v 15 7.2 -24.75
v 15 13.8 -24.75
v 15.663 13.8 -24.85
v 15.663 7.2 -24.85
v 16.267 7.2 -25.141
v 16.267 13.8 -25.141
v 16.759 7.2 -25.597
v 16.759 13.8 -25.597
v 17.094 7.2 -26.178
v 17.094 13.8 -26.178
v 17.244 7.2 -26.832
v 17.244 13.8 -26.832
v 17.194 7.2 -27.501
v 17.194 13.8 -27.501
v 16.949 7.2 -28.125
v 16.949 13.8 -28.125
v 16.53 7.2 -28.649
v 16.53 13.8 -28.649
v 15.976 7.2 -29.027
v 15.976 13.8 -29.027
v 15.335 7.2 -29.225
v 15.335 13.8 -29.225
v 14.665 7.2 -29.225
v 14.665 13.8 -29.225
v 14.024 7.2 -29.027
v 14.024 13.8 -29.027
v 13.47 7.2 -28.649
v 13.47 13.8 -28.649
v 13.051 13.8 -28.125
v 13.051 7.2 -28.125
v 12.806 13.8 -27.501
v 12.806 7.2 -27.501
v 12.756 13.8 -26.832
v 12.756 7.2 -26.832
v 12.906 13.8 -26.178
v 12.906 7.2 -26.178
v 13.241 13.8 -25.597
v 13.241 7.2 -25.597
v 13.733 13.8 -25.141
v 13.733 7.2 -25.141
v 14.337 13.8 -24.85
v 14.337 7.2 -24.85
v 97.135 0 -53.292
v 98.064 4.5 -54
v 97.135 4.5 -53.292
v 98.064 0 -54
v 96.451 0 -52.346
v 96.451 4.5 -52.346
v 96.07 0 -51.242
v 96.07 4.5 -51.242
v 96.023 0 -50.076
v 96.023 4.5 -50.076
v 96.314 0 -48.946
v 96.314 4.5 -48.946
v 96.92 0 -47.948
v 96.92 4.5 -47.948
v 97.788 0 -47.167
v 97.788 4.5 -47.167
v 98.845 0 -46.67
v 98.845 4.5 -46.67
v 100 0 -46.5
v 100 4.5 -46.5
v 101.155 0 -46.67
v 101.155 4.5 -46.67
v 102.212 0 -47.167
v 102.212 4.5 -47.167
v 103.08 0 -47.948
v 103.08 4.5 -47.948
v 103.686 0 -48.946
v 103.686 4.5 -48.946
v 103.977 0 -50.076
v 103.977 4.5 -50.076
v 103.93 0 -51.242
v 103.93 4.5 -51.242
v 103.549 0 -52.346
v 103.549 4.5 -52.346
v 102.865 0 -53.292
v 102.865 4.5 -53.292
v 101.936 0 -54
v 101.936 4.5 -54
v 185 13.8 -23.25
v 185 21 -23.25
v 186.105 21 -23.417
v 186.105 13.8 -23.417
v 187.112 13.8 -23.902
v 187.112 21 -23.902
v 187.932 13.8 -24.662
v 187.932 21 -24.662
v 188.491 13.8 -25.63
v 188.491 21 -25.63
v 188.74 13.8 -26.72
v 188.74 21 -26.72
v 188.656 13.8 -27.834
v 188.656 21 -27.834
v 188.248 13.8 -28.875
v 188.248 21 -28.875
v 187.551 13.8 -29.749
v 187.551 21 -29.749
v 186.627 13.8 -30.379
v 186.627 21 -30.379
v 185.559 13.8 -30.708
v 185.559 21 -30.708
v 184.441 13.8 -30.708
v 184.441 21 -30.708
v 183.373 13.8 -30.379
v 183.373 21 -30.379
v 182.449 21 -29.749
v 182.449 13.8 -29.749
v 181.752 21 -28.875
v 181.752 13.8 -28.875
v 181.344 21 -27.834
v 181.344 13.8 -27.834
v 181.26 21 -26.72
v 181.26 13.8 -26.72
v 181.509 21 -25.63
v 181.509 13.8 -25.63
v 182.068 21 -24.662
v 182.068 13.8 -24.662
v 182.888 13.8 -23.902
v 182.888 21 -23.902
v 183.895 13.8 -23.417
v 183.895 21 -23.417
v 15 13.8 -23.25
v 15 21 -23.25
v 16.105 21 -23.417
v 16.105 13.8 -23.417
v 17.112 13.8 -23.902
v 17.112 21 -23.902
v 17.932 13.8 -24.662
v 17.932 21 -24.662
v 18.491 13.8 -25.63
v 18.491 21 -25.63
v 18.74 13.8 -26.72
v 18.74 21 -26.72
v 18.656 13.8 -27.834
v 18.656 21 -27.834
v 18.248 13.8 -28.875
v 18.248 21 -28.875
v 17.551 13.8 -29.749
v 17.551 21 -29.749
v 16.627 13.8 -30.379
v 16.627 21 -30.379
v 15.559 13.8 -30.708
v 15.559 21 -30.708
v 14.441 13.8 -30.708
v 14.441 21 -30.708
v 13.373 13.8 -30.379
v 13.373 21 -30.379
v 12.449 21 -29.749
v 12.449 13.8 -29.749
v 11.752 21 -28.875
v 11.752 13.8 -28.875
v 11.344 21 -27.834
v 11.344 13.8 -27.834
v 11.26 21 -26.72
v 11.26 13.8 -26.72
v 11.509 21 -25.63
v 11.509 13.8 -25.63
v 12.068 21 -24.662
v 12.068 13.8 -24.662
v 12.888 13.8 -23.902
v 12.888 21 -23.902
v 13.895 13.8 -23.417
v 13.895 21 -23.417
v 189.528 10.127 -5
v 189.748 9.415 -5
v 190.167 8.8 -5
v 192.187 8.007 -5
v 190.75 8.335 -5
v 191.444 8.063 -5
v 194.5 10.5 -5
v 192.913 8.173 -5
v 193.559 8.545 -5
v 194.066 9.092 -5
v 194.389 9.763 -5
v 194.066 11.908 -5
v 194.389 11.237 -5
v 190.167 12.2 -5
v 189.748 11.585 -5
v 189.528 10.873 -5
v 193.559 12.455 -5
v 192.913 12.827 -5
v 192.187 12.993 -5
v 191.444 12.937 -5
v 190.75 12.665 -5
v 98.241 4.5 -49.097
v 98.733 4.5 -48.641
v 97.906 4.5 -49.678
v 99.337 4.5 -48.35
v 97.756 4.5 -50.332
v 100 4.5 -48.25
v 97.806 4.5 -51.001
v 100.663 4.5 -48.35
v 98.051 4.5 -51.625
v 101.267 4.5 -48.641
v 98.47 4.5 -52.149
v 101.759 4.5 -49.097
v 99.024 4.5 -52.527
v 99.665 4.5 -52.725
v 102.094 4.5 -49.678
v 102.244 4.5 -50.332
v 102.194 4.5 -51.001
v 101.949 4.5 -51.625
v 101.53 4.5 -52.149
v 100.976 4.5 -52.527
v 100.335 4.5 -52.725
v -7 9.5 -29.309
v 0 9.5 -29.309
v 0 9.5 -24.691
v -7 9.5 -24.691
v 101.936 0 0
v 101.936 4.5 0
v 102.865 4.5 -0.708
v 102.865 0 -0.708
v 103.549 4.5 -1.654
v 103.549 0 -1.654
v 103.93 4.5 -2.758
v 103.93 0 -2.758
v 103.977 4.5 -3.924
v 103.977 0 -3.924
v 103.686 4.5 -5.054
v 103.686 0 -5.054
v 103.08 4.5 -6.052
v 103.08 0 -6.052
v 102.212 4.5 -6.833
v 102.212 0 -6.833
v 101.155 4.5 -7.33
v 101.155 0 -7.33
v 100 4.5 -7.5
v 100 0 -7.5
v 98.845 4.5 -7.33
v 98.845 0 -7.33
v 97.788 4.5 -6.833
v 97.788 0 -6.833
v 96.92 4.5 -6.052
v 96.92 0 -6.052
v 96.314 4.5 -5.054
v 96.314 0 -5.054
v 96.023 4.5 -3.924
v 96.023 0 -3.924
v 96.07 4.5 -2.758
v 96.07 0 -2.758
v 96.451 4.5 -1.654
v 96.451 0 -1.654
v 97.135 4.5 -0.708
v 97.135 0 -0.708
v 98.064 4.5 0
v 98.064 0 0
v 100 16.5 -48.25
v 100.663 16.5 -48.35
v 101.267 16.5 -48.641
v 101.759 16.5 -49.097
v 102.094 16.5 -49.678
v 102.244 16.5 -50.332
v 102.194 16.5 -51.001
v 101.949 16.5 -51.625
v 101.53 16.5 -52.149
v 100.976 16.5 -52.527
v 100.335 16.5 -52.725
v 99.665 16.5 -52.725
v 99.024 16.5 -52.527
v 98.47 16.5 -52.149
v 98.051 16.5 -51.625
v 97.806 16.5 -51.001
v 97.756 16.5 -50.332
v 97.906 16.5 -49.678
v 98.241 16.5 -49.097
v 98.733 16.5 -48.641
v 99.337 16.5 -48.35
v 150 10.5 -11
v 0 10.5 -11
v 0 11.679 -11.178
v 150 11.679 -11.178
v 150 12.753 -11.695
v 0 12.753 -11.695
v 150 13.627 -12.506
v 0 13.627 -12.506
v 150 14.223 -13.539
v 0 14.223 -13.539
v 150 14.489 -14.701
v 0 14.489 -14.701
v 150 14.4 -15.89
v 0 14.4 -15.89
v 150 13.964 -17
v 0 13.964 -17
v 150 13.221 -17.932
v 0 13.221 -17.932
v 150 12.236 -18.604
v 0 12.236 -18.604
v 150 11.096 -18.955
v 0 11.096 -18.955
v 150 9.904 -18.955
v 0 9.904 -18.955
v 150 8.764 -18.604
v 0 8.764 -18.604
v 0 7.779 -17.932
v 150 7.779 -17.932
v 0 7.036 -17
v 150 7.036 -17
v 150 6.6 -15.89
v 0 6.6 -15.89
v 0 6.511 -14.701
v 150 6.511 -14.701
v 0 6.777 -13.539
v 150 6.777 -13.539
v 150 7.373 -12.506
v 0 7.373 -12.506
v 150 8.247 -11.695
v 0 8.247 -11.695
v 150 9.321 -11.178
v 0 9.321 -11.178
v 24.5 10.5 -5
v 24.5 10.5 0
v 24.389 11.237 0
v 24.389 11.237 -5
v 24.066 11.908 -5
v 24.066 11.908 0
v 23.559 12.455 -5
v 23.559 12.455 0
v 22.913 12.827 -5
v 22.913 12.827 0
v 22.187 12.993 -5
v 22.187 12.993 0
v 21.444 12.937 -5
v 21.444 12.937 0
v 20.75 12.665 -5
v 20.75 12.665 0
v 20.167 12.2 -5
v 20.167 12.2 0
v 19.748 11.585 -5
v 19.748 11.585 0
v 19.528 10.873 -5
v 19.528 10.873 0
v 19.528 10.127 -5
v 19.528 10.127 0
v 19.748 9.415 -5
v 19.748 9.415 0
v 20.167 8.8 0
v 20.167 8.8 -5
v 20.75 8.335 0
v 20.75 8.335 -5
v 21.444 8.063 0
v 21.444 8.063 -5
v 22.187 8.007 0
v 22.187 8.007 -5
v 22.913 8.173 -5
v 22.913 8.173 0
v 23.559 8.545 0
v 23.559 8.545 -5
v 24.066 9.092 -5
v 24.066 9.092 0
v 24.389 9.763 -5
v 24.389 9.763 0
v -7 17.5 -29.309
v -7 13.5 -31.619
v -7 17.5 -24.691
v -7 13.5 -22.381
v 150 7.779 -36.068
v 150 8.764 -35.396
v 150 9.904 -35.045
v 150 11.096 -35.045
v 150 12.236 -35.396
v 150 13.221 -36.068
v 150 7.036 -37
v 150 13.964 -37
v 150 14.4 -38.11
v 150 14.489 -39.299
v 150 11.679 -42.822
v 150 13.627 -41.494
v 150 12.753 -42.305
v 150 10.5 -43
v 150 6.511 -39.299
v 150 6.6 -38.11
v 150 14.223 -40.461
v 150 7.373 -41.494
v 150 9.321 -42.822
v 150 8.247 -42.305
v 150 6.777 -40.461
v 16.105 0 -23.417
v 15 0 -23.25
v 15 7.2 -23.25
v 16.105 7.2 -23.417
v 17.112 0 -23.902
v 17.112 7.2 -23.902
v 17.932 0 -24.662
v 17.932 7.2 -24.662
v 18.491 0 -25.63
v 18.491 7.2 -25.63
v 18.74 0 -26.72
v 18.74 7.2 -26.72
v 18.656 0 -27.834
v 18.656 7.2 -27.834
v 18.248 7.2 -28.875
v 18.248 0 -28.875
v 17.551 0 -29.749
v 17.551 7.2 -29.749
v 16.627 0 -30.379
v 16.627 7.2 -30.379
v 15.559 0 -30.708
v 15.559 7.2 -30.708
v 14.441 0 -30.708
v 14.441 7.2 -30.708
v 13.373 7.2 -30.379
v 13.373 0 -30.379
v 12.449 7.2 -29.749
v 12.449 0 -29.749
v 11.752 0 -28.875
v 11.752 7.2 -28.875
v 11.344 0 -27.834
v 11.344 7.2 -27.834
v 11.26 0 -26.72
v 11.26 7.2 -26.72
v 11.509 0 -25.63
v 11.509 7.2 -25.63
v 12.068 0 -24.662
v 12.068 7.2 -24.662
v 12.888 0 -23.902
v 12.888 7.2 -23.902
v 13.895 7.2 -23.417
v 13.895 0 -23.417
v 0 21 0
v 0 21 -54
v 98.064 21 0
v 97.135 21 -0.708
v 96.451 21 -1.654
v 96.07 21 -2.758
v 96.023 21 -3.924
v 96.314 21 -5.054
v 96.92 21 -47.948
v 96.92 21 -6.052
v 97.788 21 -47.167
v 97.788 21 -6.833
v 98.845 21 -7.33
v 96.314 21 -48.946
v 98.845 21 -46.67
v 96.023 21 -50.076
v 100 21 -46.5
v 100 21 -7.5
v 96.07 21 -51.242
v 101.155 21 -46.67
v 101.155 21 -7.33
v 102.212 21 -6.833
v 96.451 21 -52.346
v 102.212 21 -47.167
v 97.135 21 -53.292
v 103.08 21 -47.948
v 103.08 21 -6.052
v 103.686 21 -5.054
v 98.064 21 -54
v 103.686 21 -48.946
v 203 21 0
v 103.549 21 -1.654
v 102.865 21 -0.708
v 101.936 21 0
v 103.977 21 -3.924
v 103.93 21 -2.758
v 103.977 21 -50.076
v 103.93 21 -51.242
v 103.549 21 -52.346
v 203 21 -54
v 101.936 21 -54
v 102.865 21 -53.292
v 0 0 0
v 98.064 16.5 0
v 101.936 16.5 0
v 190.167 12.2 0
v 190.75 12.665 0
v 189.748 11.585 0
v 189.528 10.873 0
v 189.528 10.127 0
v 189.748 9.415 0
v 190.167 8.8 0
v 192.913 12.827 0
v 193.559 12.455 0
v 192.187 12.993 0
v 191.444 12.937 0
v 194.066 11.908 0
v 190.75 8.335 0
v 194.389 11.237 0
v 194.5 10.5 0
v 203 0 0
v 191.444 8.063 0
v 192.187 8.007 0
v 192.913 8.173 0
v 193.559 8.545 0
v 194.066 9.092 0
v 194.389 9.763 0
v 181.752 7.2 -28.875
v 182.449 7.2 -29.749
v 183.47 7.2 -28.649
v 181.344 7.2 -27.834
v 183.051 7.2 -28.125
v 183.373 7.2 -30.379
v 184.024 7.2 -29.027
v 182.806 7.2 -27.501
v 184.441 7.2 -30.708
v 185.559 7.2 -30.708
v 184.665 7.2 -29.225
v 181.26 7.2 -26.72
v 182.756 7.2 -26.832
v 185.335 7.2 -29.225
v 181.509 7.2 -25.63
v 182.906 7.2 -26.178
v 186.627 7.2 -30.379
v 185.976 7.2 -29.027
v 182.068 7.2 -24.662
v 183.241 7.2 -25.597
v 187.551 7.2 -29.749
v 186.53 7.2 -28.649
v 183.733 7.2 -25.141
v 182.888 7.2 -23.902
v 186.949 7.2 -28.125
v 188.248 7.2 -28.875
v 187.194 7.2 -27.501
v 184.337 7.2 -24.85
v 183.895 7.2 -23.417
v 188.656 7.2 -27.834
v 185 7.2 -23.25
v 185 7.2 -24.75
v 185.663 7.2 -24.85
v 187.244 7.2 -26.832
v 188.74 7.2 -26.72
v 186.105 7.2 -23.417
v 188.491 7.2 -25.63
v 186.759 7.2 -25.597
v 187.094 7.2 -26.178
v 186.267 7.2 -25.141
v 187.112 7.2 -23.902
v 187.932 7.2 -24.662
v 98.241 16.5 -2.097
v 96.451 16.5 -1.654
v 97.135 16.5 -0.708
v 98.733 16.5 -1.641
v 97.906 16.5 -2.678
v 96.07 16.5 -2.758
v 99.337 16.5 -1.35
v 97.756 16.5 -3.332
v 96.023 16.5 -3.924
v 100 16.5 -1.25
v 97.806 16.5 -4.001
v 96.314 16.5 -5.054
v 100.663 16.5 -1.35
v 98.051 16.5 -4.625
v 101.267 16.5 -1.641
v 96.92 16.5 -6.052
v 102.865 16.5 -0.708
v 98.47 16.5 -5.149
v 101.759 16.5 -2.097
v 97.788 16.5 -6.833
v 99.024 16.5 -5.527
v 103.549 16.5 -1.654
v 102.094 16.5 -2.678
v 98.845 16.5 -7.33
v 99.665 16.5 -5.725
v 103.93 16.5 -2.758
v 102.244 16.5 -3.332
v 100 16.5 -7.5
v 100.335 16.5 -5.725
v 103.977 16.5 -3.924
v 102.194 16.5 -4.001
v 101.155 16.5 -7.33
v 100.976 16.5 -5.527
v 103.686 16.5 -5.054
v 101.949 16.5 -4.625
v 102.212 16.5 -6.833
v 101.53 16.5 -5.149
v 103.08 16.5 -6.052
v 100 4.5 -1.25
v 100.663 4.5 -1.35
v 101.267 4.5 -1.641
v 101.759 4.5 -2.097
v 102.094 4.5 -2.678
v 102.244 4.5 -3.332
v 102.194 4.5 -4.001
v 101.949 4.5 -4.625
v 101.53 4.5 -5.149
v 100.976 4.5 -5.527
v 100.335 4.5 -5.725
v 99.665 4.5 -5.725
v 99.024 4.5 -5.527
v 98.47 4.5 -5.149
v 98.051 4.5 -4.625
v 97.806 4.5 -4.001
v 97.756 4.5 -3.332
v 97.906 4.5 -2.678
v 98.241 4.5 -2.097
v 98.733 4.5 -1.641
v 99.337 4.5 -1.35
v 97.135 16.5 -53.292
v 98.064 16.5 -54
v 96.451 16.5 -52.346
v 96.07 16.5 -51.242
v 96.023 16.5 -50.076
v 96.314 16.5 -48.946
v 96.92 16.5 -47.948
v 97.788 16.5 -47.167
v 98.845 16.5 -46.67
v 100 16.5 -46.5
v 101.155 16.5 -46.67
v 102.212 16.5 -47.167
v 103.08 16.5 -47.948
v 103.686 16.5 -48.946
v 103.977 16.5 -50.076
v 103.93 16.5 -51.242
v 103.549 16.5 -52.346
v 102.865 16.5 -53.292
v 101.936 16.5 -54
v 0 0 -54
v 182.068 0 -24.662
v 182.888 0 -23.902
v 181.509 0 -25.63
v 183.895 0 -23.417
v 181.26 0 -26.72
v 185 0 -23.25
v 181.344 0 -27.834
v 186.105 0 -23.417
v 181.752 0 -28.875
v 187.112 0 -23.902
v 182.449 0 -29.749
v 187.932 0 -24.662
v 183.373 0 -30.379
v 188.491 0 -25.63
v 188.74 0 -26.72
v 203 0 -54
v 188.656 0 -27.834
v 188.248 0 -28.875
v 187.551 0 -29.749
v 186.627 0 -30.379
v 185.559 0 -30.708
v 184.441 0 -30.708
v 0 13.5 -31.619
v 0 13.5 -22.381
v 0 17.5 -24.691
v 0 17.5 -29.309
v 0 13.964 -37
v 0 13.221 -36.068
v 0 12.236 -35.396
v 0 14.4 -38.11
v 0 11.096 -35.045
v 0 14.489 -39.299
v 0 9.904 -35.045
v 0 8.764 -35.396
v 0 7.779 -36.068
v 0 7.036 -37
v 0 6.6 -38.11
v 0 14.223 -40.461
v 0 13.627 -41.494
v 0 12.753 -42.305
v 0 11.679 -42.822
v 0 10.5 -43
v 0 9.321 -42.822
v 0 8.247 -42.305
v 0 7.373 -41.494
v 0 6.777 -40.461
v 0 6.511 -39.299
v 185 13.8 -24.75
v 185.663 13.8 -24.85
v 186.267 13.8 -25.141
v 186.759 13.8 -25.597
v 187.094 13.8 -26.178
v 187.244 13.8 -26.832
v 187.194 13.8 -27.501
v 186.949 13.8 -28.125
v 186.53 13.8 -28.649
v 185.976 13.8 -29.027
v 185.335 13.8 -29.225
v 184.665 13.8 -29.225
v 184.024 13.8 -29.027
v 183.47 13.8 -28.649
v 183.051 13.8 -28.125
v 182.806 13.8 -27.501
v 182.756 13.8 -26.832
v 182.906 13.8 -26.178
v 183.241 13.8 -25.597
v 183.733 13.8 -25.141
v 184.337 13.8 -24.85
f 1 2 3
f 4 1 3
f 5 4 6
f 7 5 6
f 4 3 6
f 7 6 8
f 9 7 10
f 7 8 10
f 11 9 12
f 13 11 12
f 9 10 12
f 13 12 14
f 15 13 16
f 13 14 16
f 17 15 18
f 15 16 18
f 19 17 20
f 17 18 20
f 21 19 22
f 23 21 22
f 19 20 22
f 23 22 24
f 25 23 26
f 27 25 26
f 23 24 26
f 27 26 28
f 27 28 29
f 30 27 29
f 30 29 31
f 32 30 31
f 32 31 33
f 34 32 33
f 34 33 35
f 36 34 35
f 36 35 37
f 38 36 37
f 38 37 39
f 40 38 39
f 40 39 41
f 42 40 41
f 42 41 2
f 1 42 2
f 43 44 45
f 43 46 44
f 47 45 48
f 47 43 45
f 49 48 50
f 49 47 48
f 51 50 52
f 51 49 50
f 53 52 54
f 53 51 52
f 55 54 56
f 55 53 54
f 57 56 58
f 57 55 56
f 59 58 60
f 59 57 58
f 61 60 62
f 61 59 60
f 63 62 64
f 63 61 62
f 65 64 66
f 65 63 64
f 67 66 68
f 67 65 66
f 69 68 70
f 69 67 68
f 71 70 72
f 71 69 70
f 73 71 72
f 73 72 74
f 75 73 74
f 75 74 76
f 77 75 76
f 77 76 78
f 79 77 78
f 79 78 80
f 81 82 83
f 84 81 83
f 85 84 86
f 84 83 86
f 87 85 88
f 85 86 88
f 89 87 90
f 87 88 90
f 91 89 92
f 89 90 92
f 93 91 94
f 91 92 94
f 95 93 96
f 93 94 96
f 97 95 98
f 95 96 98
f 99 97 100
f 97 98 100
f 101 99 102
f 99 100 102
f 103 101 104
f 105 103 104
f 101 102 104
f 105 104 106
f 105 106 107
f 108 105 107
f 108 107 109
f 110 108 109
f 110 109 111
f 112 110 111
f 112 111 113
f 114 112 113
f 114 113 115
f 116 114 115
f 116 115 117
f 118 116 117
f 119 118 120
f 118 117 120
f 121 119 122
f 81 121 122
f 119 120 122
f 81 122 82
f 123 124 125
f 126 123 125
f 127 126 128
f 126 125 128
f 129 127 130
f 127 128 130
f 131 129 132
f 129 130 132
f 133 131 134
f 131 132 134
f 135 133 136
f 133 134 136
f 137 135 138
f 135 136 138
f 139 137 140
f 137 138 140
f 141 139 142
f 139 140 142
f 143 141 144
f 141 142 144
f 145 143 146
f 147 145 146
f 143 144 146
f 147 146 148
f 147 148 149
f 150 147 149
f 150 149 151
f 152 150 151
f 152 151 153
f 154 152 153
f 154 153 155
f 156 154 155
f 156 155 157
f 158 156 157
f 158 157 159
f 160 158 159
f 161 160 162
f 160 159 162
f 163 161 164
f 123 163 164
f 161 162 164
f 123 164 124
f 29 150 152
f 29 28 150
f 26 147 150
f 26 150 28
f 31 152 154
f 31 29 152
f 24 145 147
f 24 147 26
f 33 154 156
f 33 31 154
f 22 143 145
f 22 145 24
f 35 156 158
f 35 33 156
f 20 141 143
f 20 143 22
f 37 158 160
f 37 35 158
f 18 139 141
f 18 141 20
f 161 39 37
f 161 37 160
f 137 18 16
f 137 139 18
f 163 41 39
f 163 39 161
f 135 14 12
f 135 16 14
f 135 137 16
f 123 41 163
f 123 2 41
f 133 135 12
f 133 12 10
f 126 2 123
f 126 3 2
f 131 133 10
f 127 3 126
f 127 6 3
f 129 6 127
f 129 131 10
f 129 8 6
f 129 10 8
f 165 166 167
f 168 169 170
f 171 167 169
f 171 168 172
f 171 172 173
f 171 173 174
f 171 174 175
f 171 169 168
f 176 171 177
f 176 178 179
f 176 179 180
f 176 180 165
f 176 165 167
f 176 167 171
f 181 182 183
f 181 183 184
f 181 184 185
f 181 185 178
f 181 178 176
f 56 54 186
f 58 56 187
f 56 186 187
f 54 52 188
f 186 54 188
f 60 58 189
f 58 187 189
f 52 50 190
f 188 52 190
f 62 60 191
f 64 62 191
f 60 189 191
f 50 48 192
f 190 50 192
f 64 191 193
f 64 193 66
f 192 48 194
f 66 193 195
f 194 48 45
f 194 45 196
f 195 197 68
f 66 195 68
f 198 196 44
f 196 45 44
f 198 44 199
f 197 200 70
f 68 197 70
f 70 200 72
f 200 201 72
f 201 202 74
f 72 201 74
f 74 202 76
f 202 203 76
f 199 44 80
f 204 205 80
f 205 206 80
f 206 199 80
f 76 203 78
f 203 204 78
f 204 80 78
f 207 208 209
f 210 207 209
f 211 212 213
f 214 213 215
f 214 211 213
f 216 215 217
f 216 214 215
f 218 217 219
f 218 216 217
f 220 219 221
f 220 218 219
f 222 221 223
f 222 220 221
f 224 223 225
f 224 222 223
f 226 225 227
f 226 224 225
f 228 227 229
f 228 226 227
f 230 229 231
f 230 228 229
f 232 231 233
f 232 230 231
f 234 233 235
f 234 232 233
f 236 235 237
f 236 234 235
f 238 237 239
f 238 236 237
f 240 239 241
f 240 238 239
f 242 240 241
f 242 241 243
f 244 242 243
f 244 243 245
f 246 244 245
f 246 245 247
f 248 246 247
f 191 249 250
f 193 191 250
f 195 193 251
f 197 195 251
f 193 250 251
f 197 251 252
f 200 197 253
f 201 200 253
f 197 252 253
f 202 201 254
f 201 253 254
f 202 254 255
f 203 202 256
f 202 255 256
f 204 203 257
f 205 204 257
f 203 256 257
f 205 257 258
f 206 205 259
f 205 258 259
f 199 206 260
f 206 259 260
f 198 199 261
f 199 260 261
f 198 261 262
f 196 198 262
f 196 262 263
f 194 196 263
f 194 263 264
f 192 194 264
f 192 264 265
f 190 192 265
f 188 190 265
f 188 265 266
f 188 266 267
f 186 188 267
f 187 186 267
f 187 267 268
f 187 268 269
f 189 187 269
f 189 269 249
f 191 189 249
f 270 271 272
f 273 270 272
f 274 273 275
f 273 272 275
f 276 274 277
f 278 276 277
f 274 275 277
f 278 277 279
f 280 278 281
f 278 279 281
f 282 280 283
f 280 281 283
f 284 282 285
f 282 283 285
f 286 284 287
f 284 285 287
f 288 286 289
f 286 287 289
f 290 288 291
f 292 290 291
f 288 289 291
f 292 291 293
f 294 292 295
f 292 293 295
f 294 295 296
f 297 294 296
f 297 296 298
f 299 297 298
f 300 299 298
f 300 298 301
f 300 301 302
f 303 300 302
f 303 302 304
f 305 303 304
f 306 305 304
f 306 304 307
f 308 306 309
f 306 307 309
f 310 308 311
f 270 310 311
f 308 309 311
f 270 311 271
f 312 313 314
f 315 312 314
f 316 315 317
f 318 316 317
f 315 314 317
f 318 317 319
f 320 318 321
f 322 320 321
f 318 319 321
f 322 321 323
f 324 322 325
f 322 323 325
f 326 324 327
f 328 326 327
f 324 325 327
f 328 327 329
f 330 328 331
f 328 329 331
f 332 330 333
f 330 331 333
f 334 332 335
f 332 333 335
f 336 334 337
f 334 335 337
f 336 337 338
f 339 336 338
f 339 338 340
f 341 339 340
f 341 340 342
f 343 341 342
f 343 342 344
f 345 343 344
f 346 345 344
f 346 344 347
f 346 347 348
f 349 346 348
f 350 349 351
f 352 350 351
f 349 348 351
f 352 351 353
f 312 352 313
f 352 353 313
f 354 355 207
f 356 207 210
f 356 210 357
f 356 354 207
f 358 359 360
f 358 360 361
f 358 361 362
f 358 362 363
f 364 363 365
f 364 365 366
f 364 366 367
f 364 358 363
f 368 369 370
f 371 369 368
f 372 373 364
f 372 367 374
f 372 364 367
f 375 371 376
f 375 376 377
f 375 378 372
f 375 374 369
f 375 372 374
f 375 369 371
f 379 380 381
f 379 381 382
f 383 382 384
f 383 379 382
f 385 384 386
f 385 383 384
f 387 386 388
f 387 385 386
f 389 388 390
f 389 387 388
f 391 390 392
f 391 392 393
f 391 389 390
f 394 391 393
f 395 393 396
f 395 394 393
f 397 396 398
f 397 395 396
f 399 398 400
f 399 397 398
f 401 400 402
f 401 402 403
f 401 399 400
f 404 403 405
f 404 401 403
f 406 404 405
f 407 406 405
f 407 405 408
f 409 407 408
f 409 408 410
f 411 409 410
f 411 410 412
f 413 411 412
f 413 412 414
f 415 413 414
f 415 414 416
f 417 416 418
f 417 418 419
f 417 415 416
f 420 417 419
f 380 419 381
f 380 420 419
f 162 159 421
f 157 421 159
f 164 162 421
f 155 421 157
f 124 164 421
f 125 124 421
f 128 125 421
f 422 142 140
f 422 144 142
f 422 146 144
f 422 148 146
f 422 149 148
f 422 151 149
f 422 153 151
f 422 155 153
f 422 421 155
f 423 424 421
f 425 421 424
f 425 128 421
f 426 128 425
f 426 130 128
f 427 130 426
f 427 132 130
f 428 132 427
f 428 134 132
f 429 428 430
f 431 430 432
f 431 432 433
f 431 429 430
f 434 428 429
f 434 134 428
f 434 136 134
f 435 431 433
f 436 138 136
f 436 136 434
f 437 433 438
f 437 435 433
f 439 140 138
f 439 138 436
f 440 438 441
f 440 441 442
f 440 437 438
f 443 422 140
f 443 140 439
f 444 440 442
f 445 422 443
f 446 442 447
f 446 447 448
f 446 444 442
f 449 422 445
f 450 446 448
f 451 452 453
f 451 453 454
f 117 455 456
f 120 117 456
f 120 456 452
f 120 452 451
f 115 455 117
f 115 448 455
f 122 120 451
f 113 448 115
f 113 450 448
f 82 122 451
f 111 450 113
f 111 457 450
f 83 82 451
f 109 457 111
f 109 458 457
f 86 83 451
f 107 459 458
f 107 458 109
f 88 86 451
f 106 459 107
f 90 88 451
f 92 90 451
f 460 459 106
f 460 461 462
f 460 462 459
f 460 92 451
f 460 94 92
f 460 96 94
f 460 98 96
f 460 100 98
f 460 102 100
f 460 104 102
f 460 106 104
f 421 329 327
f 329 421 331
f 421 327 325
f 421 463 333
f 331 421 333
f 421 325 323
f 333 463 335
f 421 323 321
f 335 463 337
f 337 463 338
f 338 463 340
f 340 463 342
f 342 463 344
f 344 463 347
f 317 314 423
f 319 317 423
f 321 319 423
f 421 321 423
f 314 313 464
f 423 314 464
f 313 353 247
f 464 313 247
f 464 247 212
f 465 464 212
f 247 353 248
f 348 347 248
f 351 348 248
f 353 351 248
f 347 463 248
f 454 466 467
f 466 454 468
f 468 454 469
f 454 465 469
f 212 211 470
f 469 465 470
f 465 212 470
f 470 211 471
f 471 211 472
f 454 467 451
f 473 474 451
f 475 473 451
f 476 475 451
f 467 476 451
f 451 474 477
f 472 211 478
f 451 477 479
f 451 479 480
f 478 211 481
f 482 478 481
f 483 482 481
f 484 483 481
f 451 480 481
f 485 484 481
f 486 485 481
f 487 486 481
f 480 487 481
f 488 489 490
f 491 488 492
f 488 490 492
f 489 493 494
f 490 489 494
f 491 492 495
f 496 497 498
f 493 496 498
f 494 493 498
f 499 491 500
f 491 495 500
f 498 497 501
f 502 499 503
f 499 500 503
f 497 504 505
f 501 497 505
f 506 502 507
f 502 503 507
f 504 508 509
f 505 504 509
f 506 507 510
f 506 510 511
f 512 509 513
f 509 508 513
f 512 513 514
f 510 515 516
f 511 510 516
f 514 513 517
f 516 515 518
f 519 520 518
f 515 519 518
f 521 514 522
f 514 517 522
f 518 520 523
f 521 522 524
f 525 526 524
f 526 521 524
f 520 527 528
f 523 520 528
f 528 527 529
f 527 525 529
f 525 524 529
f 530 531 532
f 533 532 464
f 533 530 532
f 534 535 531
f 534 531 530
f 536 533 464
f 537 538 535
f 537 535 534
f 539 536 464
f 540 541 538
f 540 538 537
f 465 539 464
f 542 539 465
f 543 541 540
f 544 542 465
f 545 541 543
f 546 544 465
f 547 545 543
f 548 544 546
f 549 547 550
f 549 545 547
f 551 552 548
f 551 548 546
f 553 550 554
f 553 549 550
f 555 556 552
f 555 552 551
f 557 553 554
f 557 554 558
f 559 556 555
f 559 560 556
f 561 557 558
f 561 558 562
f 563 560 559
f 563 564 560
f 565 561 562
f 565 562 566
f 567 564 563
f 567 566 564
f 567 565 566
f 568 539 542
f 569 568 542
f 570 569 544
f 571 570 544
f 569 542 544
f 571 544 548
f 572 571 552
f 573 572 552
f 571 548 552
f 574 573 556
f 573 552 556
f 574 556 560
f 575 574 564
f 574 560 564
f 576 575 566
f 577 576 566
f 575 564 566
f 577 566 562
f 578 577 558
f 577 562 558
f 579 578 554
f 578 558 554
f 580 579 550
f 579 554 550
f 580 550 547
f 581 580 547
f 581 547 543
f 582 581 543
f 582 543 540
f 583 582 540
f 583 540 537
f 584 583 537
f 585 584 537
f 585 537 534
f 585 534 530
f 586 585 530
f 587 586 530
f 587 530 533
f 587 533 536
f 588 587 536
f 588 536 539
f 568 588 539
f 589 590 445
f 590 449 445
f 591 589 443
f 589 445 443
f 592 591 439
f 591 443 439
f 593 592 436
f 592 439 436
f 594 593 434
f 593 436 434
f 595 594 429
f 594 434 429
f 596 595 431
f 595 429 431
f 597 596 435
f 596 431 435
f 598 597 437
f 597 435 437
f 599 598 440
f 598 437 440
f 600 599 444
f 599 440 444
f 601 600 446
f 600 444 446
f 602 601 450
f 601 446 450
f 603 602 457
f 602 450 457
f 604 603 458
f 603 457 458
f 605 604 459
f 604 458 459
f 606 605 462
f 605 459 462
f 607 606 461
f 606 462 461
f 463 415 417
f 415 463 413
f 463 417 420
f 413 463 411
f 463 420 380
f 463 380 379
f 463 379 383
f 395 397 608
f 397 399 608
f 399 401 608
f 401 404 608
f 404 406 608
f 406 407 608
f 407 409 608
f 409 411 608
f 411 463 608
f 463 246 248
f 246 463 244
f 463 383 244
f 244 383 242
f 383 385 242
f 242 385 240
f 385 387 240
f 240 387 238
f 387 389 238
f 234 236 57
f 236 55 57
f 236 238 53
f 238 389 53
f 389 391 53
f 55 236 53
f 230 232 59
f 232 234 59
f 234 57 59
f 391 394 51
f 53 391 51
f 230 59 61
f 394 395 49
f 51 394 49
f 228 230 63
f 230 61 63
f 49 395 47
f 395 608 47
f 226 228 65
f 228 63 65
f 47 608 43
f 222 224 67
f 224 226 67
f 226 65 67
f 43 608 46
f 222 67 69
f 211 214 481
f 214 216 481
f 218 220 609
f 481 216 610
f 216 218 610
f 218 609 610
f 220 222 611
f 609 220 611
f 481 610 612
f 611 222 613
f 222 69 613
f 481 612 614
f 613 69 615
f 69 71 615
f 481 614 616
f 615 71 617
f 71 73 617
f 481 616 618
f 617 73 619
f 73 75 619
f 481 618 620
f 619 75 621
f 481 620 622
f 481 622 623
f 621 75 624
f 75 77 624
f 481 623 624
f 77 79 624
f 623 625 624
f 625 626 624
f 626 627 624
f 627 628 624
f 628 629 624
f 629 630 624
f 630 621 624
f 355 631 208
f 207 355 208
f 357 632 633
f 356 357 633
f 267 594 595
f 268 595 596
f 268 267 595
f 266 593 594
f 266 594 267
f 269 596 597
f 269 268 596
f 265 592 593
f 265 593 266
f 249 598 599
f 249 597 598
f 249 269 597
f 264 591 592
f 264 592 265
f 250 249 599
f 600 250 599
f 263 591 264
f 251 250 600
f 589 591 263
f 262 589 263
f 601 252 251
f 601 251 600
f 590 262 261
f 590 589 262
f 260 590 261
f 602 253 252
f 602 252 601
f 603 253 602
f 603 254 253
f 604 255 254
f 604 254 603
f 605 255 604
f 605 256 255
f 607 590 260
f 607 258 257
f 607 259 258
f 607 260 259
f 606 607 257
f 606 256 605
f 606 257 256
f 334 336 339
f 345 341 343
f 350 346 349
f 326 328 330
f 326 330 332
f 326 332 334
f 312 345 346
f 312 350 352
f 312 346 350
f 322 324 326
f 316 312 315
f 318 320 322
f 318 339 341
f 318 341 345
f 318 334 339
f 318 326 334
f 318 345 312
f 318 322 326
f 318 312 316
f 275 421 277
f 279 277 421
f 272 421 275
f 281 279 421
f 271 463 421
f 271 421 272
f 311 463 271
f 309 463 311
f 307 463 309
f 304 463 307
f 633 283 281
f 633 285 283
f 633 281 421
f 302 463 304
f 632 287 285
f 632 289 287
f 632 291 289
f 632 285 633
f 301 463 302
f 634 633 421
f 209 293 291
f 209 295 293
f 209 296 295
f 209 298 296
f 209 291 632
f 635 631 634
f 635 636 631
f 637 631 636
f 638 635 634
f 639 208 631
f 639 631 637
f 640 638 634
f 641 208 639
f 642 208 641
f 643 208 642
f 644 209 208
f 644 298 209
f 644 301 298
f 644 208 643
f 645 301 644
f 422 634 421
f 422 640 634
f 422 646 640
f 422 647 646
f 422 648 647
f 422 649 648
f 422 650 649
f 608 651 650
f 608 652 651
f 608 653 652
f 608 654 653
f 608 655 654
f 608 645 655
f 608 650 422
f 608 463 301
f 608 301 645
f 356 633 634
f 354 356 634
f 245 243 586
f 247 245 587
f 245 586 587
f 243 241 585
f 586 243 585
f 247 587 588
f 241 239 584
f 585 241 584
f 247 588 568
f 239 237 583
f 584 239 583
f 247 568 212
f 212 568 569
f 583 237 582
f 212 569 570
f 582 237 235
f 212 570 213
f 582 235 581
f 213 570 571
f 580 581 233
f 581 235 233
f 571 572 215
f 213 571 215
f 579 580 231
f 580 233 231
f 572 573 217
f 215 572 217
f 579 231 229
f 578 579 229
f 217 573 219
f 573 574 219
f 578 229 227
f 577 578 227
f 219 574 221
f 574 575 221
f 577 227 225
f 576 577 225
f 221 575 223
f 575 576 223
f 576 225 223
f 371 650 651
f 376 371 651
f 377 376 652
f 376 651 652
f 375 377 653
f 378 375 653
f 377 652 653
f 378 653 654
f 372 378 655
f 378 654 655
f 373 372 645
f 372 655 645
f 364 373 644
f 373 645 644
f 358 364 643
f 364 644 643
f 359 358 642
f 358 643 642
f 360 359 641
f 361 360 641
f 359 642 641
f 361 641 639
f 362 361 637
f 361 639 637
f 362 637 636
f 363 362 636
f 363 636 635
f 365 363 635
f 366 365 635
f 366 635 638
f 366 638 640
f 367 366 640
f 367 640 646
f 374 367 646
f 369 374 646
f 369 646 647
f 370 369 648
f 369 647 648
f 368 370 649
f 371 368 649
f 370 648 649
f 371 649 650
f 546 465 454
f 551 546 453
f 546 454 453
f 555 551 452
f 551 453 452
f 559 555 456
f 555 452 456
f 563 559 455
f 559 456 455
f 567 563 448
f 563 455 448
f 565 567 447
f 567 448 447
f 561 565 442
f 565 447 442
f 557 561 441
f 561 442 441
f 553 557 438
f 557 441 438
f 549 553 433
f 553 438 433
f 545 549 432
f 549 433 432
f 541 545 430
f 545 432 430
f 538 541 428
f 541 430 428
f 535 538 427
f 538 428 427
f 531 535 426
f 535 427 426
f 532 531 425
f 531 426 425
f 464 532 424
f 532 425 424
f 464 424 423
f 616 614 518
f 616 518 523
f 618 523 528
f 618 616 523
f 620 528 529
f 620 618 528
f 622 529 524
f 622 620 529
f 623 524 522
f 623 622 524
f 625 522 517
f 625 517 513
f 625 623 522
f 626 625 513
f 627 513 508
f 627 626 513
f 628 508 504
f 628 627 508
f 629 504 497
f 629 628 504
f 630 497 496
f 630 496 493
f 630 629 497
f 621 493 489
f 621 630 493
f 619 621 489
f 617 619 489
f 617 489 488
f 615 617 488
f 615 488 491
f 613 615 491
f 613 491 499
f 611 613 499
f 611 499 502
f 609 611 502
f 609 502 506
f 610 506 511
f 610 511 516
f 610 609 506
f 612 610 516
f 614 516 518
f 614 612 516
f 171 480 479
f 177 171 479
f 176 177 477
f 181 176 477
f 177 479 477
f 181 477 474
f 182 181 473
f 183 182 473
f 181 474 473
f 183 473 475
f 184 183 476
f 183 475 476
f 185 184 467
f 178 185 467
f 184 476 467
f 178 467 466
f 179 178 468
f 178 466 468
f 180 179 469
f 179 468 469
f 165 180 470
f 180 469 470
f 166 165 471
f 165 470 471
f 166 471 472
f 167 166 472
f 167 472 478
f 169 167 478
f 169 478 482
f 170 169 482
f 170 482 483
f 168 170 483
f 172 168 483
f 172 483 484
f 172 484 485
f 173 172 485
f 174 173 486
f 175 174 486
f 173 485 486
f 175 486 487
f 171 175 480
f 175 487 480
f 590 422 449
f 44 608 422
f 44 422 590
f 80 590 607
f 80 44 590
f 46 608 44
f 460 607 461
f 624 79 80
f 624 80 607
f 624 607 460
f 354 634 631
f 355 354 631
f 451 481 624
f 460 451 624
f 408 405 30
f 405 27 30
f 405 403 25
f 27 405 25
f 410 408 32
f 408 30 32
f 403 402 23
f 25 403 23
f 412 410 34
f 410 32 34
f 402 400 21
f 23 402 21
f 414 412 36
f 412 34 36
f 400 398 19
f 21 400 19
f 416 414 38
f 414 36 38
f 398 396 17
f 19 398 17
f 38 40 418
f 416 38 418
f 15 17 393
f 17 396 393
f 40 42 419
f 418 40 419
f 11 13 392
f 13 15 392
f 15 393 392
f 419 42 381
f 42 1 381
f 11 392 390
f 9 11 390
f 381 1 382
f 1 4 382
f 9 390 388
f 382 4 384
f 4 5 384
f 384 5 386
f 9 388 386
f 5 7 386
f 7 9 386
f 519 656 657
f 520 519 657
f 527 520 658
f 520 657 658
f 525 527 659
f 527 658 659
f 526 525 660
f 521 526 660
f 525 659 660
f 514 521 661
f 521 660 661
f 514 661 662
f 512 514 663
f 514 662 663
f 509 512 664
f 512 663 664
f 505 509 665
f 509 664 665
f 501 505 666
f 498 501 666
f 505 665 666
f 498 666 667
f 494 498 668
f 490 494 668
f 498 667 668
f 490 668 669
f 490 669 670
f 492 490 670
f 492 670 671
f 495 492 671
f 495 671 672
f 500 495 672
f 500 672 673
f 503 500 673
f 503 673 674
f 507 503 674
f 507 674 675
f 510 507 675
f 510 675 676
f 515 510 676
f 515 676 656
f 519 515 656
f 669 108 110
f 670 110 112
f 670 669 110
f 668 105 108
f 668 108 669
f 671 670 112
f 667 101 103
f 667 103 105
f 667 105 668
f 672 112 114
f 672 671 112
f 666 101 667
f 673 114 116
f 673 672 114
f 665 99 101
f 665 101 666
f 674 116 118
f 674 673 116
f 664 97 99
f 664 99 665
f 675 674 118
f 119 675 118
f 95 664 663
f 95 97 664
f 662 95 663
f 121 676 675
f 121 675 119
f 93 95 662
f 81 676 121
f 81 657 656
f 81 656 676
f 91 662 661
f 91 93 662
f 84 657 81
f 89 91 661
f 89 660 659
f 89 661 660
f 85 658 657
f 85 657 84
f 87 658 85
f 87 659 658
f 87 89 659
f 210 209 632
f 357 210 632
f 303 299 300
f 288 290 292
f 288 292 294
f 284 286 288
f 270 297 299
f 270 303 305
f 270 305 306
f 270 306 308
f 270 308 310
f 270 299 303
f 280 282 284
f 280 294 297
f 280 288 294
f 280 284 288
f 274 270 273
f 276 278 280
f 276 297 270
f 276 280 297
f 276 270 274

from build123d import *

# Parameters (mm, degrees)
SKETCH_1_W          = 203
SKETCH_1_H          = 54
EXTRUDE_1_DEPTH     = 21
SKETCH_2_R          = 4
CUT_EXTRUDE_1_DEPTH = 150
SKETCH_3_R          = 2.25
CUT_EXTRUDE_2_DEPTH = 212.106608139
SKETCH_4_R          = 4
CUT_EXTRUDE_3_DEPTH = 4.5
SKETCH_5_R          = 3.75
CUT_EXTRUDE_4_DEPTH = 7.2
SKETCH_6_R          = 2.5
CUT_EXTRUDE_5_DEPTH = 5
EXTRUDE_2_DEPTH     = 7


with BuildPart() as part:
    # 草图1 → 凸台-拉伸1 (new body)
    with BuildSketch(Plane(origin=(0, 0, 0), x_dir=(1, 0, 0), z_dir=(0, 1, 0))):
        with Locations((101.5, 27)):
            Rectangle(SKETCH_1_W, SKETCH_1_H)
    extrude(amount=EXTRUDE_1_DEPTH)

    # 草图2 → 切除-拉伸1 (cut)
    with BuildSketch(Plane.ZY):
        with Locations((-15, 10.5)):
            Circle(SKETCH_2_R)
        with Locations(Location((-39, 10.5, 0), (0, 0, 180))):
            Circle(SKETCH_2_R)
    extrude(amount=-CUT_EXTRUDE_1_DEPTH, mode=Mode.SUBTRACT)

    # 草图3 → 切除-拉伸2 (cut, through all)
    with BuildSketch(Plane(origin=(0, 21, 0), x_dir=(1, 0, 0), z_dir=(0, 1, 0))):
        with Locations(Location((100, 3.5, 0), (0, 0, 270))):
            Circle(SKETCH_3_R)
        with Locations(Location((100, 50.5, 0), (0, 0, 270))):
            Circle(SKETCH_3_R)
        with Locations(Location((15, 27, 0), (0, 0, 270))):
            Circle(SKETCH_3_R)
        with Locations(Location((185, 27, 0), (0, 0, 270))):
            Circle(SKETCH_3_R)
    extrude(amount=-CUT_EXTRUDE_2_DEPTH, mode=Mode.SUBTRACT)

    # 草图4 → 切除-拉伸3 (cut)
    with BuildSketch(Plane(origin=(0, 21, 0), x_dir=(1, 0, 0), z_dir=(0, 1, 0))):
        with Locations((100, 50.5)):
            Circle(SKETCH_4_R)
        with Locations((100, 3.5)):
            Circle(SKETCH_4_R)
    cut_extrude_3 = extrude(amount=-CUT_EXTRUDE_3_DEPTH, mode=Mode.SUBTRACT)

    # 草图5 → 切除-拉伸4 (cut)
    with BuildSketch(Plane(origin=(0, 21, 0), x_dir=(1, 0, 0), z_dir=(0, 1, 0))):
        with Locations(Location((185, 27, 0), (0, 0, 270))):
            Circle(SKETCH_5_R)
        with Locations(Location((15, 27, 0), (0, 0, 270))):
            Circle(SKETCH_5_R)
    cut_extrude_4 = extrude(amount=-CUT_EXTRUDE_4_DEPTH, mode=Mode.SUBTRACT)

    # 镜向1: 切除-拉伸3, 切除-拉伸4 across plane
    add(cut_extrude_3.mirror(Plane(origin=(0, 10.5, 0), x_dir=(0, 0, 1), z_dir=(0, -1, 0))), mode=Mode.SUBTRACT)
    add(cut_extrude_4.mirror(Plane(origin=(0, 10.5, 0), x_dir=(0, 0, 1), z_dir=(0, -1, 0))), mode=Mode.SUBTRACT)

    # 草图6 → 切除-拉伸5 (cut)
    with BuildSketch(Plane.XY):
        with Locations((22, 10.5)):
            Circle(SKETCH_6_R)
        with Locations((192, 10.5)):
            Circle(SKETCH_6_R)
    extrude(amount=-CUT_EXTRUDE_5_DEPTH, mode=Mode.SUBTRACT)

    # 草图7 → 凸台-拉伸2 (add)
    with BuildSketch(Plane.ZY):
        Polygon((-24.690598923, 17.5), (-29.309401077, 17.5), (-31.618802154, 13.5), (-29.309401077, 9.5), (-24.690598923, 9.5), (-22.381197846, 13.5), align=None)
    extrude(amount=EXTRUDE_2_DEPTH)


solid = part.part
